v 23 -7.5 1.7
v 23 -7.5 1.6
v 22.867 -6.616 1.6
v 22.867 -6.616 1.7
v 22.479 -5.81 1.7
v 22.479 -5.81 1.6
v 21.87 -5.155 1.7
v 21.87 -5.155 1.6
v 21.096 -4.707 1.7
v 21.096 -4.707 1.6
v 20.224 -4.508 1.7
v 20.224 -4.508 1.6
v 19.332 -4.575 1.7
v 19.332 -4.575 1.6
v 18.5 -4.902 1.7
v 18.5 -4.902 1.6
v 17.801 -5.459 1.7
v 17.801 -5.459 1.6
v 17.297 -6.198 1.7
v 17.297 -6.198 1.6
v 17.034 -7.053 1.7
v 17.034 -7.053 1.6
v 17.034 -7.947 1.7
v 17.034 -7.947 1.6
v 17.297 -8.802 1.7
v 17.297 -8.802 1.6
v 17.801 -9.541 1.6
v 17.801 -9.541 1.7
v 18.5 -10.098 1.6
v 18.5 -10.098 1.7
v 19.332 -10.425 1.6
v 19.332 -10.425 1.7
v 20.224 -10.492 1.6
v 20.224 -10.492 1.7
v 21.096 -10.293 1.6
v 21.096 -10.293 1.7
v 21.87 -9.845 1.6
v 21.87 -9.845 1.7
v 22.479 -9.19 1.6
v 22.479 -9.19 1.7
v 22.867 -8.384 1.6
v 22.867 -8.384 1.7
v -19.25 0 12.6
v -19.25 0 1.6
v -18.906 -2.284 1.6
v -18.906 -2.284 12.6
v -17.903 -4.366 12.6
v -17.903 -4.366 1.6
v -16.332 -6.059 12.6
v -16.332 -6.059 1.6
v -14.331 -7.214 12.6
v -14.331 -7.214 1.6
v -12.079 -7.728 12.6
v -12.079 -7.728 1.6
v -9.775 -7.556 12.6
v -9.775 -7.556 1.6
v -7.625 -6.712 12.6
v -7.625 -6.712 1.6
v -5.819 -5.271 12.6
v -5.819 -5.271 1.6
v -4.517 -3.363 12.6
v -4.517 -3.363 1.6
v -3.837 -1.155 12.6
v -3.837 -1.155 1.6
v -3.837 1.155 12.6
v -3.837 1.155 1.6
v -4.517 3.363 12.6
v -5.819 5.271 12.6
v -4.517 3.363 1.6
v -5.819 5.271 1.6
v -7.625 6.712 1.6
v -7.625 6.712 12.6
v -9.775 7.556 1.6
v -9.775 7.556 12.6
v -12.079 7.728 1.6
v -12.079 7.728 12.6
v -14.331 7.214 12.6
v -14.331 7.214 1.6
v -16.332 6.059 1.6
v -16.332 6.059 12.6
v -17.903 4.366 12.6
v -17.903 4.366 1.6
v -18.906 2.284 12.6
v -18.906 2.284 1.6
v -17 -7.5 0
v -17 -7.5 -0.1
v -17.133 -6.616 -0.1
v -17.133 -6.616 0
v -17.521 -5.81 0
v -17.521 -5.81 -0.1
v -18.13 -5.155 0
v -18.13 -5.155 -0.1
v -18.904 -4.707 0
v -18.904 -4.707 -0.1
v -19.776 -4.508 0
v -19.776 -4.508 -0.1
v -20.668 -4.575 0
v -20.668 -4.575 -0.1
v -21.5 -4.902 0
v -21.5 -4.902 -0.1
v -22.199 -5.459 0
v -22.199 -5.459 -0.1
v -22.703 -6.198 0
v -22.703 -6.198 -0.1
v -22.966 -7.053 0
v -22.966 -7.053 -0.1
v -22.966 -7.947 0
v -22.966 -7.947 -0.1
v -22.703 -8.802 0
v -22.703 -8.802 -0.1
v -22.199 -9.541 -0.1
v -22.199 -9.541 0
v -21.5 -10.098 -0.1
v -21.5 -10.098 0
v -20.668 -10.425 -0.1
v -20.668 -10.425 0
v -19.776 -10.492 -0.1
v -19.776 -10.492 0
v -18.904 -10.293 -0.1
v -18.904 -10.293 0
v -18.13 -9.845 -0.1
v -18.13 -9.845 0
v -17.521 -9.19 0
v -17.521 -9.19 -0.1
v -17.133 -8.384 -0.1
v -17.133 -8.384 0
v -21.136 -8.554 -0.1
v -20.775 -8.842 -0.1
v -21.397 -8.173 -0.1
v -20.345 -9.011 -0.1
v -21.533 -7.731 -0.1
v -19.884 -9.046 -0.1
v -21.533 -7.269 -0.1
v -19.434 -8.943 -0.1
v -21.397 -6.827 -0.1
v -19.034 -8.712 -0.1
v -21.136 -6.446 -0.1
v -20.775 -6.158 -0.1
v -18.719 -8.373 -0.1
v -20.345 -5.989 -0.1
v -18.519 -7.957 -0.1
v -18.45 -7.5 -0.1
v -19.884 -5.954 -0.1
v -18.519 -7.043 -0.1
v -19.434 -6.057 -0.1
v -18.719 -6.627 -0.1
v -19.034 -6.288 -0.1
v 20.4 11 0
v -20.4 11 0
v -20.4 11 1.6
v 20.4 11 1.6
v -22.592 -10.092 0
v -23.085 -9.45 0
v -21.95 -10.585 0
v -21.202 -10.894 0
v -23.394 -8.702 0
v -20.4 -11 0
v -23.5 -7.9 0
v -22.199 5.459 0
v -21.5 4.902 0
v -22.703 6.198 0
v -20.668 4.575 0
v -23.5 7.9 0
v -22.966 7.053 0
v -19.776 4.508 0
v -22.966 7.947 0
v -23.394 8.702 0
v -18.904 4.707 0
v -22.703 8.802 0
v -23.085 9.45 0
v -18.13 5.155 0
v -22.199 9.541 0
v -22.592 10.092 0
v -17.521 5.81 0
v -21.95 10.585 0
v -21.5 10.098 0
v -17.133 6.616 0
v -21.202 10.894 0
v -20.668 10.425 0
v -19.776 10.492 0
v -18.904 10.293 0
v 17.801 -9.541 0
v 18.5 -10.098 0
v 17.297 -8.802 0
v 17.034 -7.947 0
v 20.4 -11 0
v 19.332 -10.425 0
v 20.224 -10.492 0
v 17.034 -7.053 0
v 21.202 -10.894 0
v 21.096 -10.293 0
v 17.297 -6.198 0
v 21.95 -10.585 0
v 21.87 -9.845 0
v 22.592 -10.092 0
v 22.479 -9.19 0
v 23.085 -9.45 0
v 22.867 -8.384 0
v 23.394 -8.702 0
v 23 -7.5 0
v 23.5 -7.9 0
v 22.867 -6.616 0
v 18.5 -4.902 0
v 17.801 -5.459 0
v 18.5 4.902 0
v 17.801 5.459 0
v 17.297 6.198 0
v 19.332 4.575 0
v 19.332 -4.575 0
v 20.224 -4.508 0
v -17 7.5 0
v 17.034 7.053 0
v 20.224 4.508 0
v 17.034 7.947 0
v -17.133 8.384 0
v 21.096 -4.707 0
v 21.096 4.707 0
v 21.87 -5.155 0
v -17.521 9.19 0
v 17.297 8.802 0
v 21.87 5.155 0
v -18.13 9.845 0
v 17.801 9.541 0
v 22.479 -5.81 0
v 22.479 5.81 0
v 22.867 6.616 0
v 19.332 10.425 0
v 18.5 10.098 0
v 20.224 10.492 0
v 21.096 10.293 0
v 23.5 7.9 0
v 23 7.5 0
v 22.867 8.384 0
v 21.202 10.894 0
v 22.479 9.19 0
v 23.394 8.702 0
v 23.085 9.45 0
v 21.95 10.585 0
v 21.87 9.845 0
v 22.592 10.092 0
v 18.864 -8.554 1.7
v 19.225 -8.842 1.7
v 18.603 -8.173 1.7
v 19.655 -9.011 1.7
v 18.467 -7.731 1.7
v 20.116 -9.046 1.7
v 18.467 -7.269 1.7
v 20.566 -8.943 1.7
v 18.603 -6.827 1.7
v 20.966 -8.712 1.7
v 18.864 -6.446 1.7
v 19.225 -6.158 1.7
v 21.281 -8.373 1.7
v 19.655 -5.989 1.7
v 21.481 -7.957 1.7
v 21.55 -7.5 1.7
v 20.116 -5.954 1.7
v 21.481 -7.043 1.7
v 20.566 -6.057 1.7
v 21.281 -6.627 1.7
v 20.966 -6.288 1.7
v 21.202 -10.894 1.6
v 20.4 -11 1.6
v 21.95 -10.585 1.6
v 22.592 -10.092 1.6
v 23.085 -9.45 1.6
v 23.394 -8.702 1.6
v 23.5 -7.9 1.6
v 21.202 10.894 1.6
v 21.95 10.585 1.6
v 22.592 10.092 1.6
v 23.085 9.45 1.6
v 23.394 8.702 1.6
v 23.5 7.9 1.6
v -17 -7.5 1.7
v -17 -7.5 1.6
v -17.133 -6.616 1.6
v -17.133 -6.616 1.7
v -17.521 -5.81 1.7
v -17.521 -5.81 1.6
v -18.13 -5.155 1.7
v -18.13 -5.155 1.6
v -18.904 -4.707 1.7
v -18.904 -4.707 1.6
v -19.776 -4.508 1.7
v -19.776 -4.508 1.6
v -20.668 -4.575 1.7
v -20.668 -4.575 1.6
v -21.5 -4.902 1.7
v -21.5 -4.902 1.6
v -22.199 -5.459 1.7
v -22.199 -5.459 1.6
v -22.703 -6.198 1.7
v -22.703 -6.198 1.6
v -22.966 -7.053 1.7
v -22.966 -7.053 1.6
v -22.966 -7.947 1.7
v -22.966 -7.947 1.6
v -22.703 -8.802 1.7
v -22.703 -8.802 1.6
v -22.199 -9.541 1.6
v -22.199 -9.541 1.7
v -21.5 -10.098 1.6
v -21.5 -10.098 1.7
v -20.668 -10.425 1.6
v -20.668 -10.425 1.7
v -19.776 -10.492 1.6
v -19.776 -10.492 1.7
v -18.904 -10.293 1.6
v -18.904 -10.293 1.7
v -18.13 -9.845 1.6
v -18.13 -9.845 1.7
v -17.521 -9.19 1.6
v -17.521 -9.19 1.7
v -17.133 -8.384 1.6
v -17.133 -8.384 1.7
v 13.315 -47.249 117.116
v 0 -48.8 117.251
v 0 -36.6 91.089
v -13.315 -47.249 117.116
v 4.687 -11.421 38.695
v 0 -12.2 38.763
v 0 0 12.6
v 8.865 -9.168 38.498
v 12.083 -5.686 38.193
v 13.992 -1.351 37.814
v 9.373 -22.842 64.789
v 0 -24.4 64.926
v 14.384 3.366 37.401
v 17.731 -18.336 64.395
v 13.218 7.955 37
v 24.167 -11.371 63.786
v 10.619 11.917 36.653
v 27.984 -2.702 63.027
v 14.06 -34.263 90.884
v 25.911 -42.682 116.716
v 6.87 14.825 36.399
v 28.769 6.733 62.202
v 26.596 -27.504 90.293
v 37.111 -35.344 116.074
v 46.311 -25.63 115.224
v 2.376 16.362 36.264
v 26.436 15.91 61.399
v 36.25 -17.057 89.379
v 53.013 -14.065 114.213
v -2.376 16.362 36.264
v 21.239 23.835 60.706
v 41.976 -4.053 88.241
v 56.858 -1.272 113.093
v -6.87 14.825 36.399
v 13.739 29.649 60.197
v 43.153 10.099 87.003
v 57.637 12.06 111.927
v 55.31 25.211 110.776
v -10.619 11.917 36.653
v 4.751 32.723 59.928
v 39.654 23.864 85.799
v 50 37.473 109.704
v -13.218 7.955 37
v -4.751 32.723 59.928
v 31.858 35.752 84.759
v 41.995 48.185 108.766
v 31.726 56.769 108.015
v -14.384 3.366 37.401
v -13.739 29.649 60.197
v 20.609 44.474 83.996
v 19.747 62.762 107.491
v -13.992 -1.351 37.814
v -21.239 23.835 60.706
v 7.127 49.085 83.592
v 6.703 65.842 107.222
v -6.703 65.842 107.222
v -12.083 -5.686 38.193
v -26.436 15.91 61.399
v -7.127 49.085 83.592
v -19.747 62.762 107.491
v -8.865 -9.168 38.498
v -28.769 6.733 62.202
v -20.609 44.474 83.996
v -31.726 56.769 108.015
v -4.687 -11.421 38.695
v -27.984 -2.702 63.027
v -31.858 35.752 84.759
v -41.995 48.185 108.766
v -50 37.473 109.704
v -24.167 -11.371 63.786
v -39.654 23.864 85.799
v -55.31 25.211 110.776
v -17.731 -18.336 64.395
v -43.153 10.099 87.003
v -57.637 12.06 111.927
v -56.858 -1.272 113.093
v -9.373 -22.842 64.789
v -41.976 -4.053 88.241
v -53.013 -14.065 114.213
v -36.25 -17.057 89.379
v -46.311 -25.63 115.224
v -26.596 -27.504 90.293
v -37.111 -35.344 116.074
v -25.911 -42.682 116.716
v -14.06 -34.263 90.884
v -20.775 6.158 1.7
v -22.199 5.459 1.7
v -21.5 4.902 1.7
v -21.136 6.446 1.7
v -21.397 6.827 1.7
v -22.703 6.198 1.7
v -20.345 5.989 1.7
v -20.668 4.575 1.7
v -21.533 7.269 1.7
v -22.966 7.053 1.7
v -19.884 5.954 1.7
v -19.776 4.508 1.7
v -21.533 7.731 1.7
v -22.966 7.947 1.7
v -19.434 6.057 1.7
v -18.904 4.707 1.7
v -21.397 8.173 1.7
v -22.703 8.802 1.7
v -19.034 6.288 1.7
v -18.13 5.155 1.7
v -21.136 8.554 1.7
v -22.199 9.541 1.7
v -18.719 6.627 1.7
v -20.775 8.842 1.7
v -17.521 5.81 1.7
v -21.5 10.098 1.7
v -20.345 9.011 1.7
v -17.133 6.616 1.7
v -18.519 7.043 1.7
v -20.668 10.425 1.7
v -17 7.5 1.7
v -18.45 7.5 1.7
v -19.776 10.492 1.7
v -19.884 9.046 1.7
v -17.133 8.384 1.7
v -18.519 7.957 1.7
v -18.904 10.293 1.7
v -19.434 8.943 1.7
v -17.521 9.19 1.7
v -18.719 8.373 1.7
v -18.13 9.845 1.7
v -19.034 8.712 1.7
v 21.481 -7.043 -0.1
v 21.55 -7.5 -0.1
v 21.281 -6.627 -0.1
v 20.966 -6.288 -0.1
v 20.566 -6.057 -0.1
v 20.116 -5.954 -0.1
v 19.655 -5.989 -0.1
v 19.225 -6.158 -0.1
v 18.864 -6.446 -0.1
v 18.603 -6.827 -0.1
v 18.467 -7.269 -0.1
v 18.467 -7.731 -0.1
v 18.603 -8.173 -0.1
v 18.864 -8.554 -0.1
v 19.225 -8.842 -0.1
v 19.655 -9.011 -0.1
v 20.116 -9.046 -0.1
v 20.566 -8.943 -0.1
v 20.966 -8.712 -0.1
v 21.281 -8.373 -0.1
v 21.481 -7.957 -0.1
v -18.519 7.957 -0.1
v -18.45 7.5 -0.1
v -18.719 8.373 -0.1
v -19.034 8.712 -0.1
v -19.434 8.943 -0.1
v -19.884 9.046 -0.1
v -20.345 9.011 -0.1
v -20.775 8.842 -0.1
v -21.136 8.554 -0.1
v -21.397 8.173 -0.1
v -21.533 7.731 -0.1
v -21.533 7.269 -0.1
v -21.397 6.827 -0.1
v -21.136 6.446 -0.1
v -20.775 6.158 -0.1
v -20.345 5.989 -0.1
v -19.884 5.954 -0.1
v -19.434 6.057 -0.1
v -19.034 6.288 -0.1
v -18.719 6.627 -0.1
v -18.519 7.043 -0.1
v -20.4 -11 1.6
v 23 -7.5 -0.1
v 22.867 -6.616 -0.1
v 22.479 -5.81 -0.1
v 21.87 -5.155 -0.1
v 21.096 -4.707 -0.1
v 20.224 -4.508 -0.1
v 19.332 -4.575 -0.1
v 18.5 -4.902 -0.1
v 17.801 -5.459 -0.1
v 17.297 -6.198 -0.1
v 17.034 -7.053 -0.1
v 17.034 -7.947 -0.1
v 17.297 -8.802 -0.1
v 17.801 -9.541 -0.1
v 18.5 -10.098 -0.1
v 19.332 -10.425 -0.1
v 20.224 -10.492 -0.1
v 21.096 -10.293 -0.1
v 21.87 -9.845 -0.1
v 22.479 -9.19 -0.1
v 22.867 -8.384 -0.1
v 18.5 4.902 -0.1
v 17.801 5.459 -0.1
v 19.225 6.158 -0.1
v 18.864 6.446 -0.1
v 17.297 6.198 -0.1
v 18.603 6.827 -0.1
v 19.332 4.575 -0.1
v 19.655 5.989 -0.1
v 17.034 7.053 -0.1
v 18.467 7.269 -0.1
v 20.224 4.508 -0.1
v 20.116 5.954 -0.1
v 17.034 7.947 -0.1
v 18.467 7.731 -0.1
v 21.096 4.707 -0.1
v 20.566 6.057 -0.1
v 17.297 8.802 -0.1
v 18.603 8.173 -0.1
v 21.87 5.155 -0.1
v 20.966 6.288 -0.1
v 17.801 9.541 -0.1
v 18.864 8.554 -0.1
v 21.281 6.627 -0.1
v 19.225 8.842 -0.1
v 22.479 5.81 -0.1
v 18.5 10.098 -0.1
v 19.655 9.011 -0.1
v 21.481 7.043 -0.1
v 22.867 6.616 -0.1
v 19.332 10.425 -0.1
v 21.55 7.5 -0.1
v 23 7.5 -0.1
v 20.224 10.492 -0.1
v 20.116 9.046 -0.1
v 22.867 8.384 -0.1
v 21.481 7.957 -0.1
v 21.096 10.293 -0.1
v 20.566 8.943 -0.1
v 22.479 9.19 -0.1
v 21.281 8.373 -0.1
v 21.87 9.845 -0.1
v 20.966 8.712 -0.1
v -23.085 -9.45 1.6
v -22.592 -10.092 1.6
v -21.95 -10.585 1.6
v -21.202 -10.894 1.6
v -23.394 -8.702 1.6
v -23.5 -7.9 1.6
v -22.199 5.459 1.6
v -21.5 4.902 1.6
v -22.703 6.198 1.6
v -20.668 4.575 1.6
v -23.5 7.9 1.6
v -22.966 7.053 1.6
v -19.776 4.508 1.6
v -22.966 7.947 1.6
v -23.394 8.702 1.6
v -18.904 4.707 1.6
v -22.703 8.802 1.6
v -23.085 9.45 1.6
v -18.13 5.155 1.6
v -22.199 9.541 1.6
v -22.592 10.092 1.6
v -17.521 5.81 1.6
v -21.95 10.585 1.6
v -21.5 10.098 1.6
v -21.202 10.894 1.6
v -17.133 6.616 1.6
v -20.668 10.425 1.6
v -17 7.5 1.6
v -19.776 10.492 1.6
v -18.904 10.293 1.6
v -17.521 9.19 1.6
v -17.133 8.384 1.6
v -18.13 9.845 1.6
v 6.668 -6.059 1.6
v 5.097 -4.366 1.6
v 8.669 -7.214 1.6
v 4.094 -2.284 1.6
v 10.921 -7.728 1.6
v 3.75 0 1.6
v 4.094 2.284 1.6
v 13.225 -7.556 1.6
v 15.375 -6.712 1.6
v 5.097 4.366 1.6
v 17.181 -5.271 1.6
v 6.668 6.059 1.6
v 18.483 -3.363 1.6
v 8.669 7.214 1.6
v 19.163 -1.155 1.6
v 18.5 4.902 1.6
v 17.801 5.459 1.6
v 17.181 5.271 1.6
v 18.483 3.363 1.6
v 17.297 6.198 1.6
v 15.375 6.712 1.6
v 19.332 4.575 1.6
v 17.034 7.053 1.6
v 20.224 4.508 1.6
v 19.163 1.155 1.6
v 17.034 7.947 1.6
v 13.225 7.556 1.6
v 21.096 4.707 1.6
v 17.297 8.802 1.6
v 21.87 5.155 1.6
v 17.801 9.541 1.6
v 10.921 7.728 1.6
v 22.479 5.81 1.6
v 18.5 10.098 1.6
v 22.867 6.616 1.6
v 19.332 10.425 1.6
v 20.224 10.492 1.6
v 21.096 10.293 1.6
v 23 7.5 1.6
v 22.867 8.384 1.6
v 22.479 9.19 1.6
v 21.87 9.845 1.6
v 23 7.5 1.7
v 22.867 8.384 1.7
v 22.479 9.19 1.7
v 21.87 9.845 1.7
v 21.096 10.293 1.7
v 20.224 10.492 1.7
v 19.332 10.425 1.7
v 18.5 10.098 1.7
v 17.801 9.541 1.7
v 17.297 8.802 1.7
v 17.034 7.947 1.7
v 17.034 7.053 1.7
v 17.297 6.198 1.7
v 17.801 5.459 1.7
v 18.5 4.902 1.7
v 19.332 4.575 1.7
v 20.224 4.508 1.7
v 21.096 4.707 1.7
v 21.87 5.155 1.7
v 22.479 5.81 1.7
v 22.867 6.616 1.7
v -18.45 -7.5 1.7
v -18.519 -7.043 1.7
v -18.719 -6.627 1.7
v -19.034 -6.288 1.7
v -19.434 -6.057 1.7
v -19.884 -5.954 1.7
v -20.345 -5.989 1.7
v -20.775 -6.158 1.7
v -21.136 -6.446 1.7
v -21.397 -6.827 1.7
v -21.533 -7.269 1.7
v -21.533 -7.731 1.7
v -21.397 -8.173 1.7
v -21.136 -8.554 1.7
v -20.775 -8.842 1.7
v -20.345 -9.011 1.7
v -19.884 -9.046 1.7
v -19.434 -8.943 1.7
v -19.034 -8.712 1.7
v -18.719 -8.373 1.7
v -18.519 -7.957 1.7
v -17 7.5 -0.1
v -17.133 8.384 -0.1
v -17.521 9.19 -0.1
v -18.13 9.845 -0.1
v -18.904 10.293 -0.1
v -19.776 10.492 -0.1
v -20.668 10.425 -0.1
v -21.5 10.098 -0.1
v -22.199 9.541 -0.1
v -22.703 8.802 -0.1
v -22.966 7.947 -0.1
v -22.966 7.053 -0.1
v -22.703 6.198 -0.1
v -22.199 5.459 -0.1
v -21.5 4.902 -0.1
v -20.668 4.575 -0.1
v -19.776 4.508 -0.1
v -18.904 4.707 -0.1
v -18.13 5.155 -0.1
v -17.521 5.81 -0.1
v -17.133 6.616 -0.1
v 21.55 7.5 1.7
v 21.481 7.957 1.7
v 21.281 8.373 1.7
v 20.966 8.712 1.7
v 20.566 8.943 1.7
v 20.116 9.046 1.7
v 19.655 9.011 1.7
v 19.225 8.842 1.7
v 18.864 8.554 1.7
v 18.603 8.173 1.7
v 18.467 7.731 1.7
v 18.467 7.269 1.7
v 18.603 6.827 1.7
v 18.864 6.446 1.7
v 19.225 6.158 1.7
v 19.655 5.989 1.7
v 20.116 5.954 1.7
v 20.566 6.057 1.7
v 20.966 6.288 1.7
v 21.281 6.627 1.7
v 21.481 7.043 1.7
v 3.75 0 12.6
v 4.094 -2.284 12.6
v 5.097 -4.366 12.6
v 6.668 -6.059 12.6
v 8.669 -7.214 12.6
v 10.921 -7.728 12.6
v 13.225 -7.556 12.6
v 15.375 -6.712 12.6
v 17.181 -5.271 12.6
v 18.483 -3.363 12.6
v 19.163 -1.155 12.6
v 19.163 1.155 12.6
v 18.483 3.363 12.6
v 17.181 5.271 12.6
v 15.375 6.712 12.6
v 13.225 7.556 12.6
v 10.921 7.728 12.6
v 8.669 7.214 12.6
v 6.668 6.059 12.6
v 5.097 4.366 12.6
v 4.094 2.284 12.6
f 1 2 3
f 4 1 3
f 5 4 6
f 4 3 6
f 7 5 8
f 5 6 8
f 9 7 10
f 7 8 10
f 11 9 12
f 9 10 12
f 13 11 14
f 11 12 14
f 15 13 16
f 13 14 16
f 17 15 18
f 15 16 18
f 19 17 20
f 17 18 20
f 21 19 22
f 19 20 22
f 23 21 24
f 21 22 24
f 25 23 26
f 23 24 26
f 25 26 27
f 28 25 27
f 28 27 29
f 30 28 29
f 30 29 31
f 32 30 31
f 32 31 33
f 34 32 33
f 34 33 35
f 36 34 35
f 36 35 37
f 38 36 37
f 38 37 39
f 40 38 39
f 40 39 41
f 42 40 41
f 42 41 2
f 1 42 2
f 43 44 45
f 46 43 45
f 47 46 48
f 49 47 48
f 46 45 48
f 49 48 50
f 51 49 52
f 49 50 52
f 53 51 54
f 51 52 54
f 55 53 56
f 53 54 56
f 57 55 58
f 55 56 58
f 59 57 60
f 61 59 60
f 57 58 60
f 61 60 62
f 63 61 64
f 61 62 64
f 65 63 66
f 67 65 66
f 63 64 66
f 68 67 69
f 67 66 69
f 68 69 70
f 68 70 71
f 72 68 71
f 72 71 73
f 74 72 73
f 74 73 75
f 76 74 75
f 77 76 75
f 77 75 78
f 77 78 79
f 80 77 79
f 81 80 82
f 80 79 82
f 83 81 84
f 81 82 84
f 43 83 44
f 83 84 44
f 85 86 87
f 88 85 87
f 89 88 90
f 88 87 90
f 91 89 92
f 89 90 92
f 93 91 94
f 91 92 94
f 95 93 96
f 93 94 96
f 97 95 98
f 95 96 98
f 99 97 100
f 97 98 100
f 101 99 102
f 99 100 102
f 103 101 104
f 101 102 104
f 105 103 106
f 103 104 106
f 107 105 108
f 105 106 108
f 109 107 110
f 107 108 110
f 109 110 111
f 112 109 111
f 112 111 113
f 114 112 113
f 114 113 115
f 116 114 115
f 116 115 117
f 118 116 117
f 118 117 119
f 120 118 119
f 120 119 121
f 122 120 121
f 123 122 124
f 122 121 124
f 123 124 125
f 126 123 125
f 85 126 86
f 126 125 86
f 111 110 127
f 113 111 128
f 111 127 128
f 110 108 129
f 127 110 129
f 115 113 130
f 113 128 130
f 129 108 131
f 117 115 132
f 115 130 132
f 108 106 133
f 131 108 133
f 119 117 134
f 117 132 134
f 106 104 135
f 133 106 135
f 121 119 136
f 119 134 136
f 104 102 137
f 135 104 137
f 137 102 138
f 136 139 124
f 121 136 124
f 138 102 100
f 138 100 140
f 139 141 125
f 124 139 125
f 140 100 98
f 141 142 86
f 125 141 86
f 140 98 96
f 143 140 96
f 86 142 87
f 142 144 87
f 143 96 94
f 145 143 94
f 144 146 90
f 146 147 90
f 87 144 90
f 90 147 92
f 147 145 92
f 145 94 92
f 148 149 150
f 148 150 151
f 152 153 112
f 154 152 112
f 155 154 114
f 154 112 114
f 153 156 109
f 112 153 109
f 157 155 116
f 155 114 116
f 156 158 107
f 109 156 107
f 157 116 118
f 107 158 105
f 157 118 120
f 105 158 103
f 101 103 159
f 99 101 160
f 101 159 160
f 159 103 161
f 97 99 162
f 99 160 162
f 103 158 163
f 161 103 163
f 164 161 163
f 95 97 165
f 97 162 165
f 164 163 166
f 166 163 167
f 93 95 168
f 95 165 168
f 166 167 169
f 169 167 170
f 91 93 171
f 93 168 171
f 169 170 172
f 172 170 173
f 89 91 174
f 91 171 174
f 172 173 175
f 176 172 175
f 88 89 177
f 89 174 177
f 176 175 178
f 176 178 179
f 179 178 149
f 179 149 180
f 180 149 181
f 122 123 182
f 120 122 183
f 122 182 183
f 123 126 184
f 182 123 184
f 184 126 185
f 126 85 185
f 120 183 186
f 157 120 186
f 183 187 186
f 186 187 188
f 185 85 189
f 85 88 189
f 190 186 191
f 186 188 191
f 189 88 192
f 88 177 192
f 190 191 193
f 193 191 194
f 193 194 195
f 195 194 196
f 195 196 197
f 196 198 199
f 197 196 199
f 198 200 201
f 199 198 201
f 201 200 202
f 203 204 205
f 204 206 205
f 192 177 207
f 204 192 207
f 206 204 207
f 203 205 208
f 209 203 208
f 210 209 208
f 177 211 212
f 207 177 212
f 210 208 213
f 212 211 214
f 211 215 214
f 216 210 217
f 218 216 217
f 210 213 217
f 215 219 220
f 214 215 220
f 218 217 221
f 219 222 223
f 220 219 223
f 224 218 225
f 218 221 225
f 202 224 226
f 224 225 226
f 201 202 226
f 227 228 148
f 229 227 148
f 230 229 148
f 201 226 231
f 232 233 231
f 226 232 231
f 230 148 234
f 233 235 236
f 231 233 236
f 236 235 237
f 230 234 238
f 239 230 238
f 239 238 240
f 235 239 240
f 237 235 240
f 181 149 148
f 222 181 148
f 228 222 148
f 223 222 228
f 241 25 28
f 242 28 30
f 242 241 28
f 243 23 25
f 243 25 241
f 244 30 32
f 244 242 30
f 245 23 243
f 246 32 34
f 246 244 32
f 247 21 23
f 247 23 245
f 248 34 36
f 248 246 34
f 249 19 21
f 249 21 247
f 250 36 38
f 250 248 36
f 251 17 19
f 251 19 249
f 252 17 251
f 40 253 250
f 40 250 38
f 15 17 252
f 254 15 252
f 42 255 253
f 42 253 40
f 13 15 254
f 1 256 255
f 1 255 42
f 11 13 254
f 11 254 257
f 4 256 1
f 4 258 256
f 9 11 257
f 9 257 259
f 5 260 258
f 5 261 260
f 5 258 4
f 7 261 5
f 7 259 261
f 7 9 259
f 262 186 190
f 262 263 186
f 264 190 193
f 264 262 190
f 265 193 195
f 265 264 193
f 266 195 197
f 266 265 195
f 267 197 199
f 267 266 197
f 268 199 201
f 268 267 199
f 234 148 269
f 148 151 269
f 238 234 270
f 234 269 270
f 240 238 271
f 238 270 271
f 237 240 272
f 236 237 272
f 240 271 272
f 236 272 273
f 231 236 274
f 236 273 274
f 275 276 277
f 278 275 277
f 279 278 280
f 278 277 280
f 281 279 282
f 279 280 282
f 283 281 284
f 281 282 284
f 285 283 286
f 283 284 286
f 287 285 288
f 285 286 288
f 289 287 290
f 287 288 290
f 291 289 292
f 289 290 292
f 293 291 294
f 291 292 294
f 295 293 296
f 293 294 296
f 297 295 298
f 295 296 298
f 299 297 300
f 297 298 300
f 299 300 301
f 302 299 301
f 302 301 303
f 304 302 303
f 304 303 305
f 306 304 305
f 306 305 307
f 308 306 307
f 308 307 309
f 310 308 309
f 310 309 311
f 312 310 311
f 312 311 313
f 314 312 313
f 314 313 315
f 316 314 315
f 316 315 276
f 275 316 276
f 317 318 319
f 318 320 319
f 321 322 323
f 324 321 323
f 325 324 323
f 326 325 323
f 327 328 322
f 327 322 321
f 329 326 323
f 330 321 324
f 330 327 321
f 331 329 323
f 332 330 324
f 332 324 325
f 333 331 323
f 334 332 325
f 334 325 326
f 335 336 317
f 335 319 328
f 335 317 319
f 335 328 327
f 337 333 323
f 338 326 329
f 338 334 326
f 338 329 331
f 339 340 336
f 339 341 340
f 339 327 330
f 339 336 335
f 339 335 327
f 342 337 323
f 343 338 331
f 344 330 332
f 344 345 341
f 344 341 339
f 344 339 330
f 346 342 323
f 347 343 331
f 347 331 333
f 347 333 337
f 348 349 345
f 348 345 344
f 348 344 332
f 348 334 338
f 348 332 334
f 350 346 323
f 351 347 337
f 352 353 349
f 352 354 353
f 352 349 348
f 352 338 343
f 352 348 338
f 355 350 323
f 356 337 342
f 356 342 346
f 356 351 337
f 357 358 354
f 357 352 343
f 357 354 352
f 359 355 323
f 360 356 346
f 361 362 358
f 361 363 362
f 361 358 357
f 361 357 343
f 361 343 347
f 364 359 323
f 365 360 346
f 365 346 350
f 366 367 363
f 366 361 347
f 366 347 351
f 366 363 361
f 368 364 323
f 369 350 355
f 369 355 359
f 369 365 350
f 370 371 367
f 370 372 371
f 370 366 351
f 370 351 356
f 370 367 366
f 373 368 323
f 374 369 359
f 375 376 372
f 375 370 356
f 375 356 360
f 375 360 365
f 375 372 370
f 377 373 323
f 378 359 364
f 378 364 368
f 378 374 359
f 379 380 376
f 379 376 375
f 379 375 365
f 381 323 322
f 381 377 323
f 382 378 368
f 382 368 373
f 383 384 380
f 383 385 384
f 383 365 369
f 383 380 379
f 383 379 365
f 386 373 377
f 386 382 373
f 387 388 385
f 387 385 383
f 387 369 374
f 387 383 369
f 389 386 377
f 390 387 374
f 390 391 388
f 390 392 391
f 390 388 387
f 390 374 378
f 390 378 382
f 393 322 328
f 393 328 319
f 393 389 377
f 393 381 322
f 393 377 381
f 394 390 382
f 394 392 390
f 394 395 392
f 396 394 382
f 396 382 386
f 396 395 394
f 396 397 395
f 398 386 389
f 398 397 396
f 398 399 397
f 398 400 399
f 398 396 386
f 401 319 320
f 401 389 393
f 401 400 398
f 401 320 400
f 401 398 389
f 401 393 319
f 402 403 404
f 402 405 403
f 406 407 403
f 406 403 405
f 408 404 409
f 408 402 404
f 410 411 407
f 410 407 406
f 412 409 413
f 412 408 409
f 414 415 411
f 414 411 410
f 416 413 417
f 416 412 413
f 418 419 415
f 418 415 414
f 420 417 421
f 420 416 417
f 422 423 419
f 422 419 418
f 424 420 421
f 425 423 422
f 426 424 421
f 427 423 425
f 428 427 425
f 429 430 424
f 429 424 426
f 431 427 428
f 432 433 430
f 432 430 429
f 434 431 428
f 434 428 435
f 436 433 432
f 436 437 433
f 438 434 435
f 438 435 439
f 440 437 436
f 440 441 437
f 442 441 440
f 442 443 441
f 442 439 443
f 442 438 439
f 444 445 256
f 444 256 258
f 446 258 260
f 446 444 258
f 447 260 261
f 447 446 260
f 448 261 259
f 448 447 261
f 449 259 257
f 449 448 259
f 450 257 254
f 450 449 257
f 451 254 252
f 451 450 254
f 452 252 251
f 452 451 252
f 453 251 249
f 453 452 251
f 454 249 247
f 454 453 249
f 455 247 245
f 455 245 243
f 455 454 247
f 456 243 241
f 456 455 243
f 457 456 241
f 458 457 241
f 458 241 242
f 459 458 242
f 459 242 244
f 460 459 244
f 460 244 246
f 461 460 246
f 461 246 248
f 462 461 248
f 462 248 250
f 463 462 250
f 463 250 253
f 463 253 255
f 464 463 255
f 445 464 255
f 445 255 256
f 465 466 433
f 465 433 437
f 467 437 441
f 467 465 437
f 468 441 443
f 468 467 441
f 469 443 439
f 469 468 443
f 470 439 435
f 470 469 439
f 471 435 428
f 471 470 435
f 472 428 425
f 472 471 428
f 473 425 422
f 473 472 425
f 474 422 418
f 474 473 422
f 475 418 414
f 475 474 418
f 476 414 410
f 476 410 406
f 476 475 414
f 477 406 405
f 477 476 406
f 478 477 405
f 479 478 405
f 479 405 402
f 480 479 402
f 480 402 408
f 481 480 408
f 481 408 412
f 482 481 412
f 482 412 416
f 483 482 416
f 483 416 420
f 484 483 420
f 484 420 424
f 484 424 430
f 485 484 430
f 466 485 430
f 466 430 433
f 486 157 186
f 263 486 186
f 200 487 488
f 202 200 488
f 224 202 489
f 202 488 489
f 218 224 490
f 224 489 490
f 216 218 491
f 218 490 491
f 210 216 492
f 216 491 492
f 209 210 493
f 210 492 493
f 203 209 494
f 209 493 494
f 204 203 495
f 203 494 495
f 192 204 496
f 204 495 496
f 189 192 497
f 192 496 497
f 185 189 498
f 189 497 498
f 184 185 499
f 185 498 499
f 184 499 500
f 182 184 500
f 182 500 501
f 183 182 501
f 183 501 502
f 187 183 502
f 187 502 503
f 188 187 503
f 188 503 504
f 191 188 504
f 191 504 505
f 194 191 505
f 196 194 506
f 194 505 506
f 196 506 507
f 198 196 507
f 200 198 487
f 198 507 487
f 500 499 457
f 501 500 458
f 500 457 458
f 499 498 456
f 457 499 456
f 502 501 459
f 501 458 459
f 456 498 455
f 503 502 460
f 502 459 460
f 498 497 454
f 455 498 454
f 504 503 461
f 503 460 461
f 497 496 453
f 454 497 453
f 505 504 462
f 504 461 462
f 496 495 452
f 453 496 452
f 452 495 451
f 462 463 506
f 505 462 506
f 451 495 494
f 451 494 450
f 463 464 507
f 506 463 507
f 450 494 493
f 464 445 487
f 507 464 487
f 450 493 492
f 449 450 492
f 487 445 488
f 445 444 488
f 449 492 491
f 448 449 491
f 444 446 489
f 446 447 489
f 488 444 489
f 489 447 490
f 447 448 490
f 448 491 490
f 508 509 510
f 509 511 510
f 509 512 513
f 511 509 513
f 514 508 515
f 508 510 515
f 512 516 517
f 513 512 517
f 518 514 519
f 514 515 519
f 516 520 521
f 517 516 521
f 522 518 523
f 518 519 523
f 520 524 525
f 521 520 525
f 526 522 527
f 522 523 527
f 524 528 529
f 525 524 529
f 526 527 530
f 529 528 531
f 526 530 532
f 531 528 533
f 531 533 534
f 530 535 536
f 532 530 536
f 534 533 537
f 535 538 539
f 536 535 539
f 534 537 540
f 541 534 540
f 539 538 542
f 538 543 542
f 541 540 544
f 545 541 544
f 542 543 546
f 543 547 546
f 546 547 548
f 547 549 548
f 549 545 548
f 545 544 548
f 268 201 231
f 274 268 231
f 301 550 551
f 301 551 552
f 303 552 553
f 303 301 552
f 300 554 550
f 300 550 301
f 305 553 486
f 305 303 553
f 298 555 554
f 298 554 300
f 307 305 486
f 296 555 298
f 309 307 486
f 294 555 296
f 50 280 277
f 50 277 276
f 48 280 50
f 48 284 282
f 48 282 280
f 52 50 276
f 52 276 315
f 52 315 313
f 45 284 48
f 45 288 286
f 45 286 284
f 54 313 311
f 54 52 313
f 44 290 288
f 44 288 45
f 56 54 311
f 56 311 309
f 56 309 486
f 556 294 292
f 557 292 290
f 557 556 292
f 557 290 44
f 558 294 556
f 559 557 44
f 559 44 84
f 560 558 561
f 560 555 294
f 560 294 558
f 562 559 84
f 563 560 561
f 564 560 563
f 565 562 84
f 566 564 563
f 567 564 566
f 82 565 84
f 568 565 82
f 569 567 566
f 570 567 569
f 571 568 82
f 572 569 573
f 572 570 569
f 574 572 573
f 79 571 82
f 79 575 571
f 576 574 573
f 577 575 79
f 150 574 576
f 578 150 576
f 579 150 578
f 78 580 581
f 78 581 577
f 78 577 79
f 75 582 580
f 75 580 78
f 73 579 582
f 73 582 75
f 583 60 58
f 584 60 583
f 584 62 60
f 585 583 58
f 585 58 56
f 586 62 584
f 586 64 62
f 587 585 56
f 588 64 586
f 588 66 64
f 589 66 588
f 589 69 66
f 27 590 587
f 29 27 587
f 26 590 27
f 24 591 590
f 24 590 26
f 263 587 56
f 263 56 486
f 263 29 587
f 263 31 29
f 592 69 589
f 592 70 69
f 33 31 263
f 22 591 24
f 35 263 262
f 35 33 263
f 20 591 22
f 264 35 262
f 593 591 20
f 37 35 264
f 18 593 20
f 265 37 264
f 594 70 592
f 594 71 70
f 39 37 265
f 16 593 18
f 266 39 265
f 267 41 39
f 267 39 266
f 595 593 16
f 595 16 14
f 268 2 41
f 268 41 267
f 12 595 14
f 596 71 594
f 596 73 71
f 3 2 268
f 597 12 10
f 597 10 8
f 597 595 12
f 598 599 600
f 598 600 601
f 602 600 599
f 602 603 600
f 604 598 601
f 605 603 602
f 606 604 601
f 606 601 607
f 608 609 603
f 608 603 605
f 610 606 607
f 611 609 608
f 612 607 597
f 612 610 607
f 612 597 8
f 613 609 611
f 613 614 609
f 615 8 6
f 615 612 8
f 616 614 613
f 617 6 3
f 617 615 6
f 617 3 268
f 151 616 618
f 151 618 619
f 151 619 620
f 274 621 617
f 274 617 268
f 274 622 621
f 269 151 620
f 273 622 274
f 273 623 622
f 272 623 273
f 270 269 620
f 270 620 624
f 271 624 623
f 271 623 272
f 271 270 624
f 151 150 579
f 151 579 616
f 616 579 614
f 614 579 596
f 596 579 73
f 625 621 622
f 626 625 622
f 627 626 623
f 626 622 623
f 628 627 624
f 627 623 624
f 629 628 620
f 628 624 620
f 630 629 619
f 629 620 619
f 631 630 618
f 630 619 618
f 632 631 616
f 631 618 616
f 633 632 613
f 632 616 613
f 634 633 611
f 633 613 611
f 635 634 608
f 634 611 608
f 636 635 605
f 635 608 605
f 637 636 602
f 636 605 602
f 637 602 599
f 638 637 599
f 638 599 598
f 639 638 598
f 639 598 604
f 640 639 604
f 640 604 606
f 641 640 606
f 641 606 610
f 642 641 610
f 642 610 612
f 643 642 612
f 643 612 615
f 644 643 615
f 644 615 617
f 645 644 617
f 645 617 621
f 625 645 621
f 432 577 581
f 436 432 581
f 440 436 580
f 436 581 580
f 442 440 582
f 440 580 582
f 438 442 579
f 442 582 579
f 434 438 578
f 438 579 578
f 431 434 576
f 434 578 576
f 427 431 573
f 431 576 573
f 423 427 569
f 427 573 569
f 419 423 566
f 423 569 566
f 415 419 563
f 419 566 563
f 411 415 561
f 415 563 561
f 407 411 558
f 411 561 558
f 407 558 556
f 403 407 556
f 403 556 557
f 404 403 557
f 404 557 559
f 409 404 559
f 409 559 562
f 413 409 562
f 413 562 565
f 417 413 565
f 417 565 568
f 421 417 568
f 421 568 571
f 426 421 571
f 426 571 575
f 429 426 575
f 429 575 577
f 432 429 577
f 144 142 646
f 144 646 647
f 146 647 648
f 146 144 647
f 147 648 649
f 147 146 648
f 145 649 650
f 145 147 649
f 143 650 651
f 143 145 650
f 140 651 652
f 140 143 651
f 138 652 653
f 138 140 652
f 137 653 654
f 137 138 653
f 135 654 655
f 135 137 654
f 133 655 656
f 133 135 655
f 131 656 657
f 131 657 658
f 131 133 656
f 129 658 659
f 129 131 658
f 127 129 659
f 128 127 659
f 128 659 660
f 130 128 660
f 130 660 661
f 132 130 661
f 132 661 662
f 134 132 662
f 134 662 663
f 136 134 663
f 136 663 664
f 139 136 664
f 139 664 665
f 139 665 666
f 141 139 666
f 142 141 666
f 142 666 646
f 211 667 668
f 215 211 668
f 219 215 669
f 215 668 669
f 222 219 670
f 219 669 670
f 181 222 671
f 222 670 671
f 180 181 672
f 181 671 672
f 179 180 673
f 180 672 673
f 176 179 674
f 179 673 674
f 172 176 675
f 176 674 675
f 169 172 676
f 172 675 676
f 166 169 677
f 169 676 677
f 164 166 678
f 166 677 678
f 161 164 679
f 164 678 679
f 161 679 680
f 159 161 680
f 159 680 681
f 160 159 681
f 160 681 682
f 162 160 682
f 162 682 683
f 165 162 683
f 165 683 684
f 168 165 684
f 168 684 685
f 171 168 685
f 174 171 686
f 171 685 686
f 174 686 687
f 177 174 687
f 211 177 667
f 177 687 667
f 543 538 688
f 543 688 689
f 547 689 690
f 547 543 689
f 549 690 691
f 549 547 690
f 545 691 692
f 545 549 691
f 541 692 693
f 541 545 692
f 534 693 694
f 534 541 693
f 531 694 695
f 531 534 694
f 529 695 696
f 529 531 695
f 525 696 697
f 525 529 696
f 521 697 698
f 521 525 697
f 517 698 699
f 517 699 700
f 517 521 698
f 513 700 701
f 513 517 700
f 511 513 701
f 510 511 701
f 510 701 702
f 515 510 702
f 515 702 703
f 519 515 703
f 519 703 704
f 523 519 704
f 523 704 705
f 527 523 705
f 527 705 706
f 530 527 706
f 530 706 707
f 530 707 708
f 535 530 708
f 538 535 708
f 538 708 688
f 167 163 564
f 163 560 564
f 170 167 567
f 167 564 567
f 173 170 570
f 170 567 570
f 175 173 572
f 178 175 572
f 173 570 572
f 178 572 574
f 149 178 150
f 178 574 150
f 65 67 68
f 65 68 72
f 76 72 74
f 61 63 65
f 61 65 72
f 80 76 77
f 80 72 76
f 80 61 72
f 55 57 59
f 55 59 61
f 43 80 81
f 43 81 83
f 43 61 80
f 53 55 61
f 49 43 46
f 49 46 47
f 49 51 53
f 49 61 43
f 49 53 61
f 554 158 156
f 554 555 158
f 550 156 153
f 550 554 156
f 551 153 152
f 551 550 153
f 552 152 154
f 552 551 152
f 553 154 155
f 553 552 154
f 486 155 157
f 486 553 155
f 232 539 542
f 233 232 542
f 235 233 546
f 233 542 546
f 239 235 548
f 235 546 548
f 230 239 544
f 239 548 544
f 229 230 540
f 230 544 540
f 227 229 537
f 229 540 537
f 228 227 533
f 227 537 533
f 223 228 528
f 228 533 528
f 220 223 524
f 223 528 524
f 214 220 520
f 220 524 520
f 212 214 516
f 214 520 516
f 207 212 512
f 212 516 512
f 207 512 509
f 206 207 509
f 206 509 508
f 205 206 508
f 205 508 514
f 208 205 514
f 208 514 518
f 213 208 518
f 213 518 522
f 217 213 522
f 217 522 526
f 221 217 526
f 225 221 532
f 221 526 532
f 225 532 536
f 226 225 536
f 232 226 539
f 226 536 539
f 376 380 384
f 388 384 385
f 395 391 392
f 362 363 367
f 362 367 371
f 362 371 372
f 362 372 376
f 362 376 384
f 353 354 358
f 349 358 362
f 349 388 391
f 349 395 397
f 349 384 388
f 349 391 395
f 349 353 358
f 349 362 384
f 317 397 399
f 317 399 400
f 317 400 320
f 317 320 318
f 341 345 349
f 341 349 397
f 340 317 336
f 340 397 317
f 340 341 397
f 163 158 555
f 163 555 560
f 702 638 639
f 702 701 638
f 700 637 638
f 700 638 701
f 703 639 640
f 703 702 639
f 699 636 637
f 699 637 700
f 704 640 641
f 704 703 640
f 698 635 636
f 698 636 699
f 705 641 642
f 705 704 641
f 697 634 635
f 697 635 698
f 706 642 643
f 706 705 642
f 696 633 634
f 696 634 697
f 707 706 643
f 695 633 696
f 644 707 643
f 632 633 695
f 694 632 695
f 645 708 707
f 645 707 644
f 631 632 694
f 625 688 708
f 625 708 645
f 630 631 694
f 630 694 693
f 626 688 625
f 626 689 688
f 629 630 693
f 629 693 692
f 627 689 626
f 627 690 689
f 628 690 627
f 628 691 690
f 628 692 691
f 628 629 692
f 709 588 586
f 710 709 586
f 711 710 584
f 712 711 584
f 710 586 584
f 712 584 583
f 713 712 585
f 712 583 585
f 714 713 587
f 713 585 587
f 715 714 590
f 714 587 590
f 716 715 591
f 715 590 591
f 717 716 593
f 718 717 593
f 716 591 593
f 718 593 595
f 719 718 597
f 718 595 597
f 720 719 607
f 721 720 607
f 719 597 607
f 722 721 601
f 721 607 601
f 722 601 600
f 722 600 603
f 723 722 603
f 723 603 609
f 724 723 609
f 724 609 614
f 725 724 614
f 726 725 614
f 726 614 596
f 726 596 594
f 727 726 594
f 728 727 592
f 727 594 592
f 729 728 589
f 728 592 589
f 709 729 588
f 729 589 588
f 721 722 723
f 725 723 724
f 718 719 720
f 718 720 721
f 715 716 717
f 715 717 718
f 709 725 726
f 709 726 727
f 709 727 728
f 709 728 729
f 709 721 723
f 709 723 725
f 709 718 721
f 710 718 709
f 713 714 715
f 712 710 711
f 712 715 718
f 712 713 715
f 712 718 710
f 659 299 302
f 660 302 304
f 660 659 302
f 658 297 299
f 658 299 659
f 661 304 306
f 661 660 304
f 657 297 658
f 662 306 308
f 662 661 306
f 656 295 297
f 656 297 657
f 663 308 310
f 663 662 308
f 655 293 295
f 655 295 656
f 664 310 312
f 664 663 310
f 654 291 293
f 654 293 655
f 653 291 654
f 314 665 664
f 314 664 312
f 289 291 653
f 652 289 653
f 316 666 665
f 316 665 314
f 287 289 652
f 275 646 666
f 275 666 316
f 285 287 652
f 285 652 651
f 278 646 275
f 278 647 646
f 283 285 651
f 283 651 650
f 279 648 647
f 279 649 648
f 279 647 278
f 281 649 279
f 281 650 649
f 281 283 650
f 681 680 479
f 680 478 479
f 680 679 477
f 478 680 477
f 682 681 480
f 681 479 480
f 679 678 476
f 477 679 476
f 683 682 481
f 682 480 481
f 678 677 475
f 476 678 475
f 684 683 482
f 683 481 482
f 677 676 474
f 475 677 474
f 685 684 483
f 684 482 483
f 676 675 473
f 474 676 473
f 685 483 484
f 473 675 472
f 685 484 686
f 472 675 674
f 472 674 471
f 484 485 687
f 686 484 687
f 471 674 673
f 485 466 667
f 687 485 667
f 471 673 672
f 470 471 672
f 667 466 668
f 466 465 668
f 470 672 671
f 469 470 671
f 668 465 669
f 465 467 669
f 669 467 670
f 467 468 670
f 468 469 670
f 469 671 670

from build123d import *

# Parameters (mm, degrees)
SKETCH1_W                = 47
SKETCH1_H                = 22
SKETCH1_R                = 1.55
BOSS_EXTRUDE1_DEPTH      = 1.6
FILLET1_R                = 3.1
BOSS_EXTRUDE4_DEPTH      = 0.1
BOSS_EXTRUDE4_DEPTH_BACK = 1.7
SKETCH2_R                = 3
SKETCH2_R_2              = 1.55
SKETCH3_R                = 7.75
BOSS_EXTRUDE8_DEPTH      = 11


with BuildPart() as part:
    # Sketch1 → Boss-Extrude1 (new body)
    with BuildSketch(Plane.XY):
        Rectangle(SKETCH1_W, SKETCH1_H)
        with Locations((-20, 7.5)):
            Circle(SKETCH1_R, mode=Mode.SUBTRACT)
        with Locations((20, 7.5)):
            Circle(SKETCH1_R, mode=Mode.SUBTRACT)
        with Locations((20, -7.5)):
            Circle(SKETCH1_R, mode=Mode.SUBTRACT)
        with Locations((-20, -7.5)):
            Circle(SKETCH1_R, mode=Mode.SUBTRACT)
    extrude(amount=BOSS_EXTRUDE1_DEPTH)

    # Fillet1
    fillet1_edges = [part.edges().sort_by_distance(p)[0] for p in [
        (23.5, -11, 0.8),
        (-23.5, -11, 0.8),
        (-23.5, 11, 0.8),
        (23.5, 11, 0.8),
    ]]
    fillet(fillet1_edges, radius=FILLET1_R)

    # Sketch2 → Boss-Extrude4 (add, two sides: drawn at the far end of the back side and taken through both)
    # profile 1 of 4: a face of its own
    with BuildSketch(Plane.XY.offset(1.6).offset(-BOSS_EXTRUDE4_DEPTH_BACK)):
        with Locations((-20, 7.5)):
            Circle(SKETCH2_R)
        with Locations((-20, 7.5)):
            Circle(SKETCH2_R_2, mode=Mode.SUBTRACT)
    # profile 2 of 4: a face of its own
    with BuildSketch(Plane.XY.offset(1.6).offset(-BOSS_EXTRUDE4_DEPTH_BACK)):
        with Locations((-20, -7.5)):
            Circle(SKETCH2_R)
        with Locations((-20, -7.5)):
            Circle(SKETCH2_R_2, mode=Mode.SUBTRACT)
    # profile 3 of 4: a face of its own
    with BuildSketch(Plane.XY.offset(1.6).offset(-BOSS_EXTRUDE4_DEPTH_BACK)):
        with Locations((20, 7.5)):
            Circle(SKETCH2_R)
        with Locations((20, 7.5)):
            Circle(SKETCH2_R_2, mode=Mode.SUBTRACT)
    # profile 4 of 4: a face of its own
    with BuildSketch(Plane.XY.offset(1.6).offset(-BOSS_EXTRUDE4_DEPTH_BACK)):
        with Locations((20, -7.5)):
            Circle(SKETCH2_R)
        with Locations((20, -7.5)):
            Circle(SKETCH2_R_2, mode=Mode.SUBTRACT)
    extrude(amount=BOSS_EXTRUDE4_DEPTH + BOSS_EXTRUDE4_DEPTH_BACK)

    # Sketch3 → Boss-Extrude8 (add)
    with BuildSketch(Plane.XY.offset(1.6)):
        with Locations(Location((11.5, 0, 0), (0, 0, 180))):
            Circle(SKETCH3_R)
        with Locations(Location((-11.5, 0, 0), (0, 0, 180))):
            Circle(SKETCH3_R)
    extrude(amount=BOSS_EXTRUDE8_DEPTH)


with BuildPart() as body_2:
    # Sketch7 → Revolve1 (revolve)
    with BuildSketch(Plane(origin=(0, 0, 0), x_dir=(0, 0, -1), z_dir=(1, 0, 0)), mode=Mode.PRIVATE) as revolve1_sk:
        Polygon((-12.6, 0), (-107.187530655, 66.230901986), (-112.219469809, 8.715574275), align=None)
    revolve(revolve1_sk.sketch.rotate(Axis((0, 0, 12.6), (0, 0.08715574274765142, 0.9961946980917461)), 180), axis=Axis((0, 0, 12.6), (0, 0.08715574274765142, 0.9961946980917461)))


solid = Compound([part.part, body_2.part])
